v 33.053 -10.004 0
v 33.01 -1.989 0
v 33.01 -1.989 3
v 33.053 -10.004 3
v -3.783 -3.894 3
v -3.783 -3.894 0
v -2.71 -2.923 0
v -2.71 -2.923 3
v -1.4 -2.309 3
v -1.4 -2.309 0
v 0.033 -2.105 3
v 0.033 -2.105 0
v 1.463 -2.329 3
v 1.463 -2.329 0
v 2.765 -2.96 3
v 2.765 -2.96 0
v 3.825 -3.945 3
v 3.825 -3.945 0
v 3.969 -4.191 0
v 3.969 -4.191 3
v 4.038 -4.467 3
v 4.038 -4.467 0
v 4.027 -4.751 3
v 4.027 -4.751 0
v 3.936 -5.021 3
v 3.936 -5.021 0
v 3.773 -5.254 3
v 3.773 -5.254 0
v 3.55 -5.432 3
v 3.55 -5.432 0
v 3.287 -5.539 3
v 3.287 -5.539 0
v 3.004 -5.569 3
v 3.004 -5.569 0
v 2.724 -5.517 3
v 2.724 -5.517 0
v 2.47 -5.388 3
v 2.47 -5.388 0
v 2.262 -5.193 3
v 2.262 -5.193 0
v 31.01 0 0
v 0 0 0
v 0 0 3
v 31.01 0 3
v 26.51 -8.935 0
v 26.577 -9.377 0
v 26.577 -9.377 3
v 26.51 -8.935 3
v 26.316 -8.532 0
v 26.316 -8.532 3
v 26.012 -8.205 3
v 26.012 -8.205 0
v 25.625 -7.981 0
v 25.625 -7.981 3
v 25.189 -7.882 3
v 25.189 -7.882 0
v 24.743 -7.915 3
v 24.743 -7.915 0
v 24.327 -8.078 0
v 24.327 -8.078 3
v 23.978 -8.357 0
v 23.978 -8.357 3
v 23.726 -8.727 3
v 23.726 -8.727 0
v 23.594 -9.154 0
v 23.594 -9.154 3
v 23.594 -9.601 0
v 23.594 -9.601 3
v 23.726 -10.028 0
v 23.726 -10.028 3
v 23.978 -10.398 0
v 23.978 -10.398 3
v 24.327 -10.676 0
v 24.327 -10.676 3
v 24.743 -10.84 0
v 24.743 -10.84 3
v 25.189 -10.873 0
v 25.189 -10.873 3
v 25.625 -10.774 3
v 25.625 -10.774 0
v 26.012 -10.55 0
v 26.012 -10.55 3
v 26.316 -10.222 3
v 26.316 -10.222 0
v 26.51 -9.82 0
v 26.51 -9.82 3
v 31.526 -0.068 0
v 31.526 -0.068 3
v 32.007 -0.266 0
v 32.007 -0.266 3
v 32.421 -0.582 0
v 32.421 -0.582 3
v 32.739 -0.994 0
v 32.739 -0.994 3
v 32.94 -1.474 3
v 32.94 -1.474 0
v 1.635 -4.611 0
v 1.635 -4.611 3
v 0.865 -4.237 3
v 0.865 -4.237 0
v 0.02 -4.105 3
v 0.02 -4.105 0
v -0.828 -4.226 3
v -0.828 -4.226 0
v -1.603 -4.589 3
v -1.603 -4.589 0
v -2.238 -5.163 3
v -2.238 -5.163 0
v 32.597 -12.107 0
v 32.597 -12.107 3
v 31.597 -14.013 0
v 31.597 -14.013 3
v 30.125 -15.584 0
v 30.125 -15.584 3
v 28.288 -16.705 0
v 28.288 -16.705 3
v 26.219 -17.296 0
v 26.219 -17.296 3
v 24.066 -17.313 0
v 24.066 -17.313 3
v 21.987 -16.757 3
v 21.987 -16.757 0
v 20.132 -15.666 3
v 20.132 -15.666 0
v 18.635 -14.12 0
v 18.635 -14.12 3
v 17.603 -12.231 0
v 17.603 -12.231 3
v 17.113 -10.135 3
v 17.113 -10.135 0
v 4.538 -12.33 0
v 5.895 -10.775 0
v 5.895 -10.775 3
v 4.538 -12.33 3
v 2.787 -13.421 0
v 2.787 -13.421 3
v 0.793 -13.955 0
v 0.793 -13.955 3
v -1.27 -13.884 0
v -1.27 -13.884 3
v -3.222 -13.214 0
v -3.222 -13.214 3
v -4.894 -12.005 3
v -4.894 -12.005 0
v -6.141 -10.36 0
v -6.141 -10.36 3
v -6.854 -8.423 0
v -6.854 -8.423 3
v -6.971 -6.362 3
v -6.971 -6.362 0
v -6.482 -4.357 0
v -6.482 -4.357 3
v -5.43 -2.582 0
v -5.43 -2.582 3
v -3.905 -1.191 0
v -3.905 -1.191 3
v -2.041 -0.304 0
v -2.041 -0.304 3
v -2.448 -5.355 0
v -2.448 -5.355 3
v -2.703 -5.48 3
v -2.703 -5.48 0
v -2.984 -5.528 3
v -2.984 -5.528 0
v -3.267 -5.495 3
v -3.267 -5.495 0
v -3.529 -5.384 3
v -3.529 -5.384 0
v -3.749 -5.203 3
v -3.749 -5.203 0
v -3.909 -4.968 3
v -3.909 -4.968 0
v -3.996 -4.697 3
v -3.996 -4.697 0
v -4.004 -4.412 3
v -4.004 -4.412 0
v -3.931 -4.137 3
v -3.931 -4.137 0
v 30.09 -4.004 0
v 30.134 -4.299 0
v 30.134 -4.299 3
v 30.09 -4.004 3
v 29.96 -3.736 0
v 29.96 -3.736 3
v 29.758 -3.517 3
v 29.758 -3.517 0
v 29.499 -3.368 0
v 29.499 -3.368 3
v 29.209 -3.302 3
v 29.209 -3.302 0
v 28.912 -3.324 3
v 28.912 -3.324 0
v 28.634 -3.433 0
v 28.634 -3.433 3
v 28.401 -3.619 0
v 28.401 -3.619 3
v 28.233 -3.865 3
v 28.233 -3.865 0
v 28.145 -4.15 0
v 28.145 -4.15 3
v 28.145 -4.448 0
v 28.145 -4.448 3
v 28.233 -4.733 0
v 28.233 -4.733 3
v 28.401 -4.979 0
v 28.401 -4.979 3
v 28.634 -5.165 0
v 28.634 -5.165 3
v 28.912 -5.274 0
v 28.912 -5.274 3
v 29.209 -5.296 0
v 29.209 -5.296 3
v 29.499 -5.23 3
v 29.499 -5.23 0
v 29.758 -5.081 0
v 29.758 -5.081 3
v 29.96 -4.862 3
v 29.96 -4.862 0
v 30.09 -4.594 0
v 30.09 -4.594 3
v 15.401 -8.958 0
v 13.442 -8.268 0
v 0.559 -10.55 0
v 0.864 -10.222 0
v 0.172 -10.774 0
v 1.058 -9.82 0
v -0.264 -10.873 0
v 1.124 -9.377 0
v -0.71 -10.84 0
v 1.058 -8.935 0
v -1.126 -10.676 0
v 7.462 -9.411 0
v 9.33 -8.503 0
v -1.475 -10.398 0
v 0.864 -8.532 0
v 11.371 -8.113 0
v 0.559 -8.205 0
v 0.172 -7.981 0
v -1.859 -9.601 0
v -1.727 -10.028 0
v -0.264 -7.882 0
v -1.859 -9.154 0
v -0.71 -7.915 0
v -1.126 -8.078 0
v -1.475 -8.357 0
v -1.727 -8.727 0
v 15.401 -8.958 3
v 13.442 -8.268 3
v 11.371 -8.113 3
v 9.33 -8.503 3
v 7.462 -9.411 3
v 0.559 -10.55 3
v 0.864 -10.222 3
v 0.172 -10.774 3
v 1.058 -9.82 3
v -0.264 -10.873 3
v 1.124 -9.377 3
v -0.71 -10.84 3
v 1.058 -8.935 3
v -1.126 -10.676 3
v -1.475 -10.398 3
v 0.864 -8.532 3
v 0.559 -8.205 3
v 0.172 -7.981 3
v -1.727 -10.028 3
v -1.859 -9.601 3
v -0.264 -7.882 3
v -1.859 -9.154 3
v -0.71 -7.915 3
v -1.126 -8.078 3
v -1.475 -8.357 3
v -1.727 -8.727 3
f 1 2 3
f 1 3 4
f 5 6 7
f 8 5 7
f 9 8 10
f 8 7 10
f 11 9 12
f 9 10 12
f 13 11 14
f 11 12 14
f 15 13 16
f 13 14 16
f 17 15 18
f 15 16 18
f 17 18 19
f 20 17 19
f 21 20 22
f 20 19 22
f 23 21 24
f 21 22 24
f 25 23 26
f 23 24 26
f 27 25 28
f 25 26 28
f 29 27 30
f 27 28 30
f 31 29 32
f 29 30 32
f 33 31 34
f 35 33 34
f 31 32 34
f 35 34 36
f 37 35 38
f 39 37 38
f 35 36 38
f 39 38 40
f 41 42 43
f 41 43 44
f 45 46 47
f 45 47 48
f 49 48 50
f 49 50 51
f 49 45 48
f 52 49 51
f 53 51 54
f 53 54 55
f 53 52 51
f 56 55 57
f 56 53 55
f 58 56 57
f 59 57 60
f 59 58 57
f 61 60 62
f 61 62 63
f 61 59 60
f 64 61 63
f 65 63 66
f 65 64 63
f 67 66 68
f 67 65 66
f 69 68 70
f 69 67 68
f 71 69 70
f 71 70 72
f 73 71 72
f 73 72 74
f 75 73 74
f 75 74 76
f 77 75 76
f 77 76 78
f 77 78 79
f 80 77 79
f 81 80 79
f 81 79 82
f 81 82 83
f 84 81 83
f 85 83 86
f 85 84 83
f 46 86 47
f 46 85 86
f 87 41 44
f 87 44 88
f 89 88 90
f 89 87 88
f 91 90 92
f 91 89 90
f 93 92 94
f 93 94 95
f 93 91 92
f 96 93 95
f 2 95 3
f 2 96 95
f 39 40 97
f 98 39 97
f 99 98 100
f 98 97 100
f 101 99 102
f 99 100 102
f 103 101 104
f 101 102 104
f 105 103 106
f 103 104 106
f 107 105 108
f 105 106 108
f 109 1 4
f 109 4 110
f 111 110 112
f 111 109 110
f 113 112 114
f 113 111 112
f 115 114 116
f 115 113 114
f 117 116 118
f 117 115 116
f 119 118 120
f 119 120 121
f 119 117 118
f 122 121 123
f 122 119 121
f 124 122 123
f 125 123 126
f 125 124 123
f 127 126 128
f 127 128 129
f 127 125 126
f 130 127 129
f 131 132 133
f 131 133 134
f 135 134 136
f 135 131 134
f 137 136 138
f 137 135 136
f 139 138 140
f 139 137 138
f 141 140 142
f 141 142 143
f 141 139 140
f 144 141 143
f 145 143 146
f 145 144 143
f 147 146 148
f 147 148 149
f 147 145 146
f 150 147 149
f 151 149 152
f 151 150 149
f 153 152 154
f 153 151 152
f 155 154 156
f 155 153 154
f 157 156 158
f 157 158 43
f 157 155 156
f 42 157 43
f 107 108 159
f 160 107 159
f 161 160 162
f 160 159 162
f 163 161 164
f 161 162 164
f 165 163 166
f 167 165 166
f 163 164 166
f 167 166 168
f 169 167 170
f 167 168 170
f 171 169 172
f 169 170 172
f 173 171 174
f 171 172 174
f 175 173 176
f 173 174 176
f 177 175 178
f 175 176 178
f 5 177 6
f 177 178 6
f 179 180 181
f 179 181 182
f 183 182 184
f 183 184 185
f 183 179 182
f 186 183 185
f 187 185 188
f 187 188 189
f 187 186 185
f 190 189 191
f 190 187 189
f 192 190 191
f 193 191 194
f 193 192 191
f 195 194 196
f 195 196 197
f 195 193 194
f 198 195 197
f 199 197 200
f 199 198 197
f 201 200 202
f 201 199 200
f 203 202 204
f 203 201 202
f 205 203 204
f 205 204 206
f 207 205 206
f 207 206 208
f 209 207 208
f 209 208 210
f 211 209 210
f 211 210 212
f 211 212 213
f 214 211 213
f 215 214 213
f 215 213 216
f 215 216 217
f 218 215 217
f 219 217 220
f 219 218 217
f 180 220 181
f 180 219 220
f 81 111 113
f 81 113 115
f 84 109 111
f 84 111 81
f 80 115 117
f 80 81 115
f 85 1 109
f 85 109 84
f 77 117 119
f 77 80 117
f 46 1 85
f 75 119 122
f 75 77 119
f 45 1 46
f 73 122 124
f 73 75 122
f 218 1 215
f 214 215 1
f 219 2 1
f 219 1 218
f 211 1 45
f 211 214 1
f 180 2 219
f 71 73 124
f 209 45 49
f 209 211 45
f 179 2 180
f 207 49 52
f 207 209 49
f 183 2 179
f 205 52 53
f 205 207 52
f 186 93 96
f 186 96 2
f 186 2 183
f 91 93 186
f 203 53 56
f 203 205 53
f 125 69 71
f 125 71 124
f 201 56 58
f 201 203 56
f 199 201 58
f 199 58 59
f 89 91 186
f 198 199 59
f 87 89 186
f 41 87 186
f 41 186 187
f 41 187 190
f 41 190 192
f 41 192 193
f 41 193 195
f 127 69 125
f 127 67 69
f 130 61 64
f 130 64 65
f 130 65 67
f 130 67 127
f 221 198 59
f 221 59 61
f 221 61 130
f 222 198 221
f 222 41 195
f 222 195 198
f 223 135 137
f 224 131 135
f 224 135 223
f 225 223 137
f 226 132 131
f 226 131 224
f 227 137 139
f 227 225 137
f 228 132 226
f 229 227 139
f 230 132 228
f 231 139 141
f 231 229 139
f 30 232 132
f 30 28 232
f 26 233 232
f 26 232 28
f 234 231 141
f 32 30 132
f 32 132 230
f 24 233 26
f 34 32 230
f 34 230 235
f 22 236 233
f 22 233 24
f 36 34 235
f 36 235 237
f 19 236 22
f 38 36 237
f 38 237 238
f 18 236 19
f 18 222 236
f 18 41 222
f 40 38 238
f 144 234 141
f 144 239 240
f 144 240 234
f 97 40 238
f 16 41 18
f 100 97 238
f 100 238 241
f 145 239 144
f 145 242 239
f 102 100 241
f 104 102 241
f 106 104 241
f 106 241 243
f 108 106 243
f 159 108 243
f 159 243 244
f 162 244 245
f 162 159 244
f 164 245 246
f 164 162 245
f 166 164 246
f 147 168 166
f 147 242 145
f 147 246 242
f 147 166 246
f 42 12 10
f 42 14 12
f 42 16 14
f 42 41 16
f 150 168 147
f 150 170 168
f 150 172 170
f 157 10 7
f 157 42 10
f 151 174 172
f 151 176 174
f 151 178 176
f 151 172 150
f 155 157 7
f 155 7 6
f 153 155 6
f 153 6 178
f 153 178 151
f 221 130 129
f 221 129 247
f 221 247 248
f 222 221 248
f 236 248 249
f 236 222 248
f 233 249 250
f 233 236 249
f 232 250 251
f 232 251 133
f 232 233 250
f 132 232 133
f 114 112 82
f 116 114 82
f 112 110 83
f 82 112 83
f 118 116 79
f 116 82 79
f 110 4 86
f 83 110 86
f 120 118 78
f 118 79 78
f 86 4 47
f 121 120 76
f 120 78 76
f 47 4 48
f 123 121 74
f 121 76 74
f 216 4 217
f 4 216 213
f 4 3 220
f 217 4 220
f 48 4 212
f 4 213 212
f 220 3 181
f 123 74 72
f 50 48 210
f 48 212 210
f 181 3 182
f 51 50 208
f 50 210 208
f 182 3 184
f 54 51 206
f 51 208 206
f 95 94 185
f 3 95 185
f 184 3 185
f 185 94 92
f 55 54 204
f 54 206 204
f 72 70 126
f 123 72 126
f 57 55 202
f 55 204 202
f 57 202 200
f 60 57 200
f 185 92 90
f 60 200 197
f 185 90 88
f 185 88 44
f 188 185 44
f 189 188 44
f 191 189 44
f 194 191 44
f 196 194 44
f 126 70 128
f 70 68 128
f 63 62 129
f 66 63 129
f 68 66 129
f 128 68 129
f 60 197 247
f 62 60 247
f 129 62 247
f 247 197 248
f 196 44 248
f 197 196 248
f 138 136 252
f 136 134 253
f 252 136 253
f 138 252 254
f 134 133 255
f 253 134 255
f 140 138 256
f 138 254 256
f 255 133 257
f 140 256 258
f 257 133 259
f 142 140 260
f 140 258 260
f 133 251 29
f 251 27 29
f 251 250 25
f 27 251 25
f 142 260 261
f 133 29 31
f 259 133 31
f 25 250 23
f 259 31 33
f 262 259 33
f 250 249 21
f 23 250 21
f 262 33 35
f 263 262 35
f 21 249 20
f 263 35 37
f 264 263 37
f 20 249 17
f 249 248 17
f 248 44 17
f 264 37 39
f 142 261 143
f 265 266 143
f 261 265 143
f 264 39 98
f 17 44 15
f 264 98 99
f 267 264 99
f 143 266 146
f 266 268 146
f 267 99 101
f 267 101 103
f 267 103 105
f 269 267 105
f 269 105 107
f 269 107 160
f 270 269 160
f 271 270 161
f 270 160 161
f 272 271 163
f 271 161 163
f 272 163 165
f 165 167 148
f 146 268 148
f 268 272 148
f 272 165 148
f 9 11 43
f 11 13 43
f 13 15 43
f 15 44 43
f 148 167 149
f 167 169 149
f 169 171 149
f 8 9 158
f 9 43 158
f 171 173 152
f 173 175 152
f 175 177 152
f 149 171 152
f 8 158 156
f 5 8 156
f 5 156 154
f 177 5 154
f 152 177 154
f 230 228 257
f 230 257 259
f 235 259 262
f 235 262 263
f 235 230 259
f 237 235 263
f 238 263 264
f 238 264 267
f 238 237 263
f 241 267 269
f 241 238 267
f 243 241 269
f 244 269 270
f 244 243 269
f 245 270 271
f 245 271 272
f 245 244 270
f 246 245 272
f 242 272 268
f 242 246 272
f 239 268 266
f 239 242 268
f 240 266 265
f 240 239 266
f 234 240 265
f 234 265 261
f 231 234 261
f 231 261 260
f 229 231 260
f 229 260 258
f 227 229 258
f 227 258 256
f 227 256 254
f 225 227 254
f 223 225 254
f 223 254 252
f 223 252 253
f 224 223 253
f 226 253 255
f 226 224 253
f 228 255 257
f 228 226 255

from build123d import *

# Parameters (mm, degrees)
SKETCH1_R           = 1.5
SKETCH1_R_2         = 1
BOSS_EXTRUDE1_DEPTH = 3


with BuildPart() as part:
    # Sketch1 → Boss-Extrude1 (new body)
    with BuildSketch(Plane.XY):
        with BuildLine():
            Line((0, 0), (31.010482732, 0))
            ThreePointArc((31.010482732, 0), (32.420975481, -0.582075389), (33.010455116, -1.989489797))
            Line((33.010455116, -1.989489797), (33.052571579, -10.003774465))
            ThreePointArc((33.052571579, -10.003774465), (25.143173524, -17.377139631), (17.113116724, -10.13536642))
            ThreePointArc((17.113116724, -10.13536642), (11.370616348, -8.112797173), (5.895074629, -10.774664902))
            ThreePointArc((5.895074629, -10.774664902), (-6.140954906, -10.359862027), (0, 0))
        make_face()
        with Locations((25.077129875, -9.377412246)):
            Circle(SKETCH1_R, mode=Mode.SUBTRACT)
        with Locations((29.13412022, -4.298945023)):
            Circle(SKETCH1_R_2, mode=Mode.SUBTRACT)
        with Locations((-0.375746772, -9.377412246)):
            Circle(SKETCH1_R, mode=Mode.SUBTRACT)
        with BuildLine():
            ThreePointArc((2.262283142, -5.193372604), (0.019600772, -4.104927744), (-2.237613726, -5.162906542))
            ThreePointArc((-2.237613726, -5.162906542), (-3.645044504, -5.301248889), (-3.783386851, -3.893818111))
            ThreePointArc((-3.783386851, -3.893818111), (0.033141244, -2.10497358), (3.825098224, -3.945330531))
            ThreePointArc((3.825098224, -3.945330531), (3.66771172, -5.350759109), (2.262283142, -5.193372604))
        make_face(mode=Mode.SUBTRACT)
    extrude(amount=BOSS_EXTRUDE1_DEPTH)


solid = part.part
